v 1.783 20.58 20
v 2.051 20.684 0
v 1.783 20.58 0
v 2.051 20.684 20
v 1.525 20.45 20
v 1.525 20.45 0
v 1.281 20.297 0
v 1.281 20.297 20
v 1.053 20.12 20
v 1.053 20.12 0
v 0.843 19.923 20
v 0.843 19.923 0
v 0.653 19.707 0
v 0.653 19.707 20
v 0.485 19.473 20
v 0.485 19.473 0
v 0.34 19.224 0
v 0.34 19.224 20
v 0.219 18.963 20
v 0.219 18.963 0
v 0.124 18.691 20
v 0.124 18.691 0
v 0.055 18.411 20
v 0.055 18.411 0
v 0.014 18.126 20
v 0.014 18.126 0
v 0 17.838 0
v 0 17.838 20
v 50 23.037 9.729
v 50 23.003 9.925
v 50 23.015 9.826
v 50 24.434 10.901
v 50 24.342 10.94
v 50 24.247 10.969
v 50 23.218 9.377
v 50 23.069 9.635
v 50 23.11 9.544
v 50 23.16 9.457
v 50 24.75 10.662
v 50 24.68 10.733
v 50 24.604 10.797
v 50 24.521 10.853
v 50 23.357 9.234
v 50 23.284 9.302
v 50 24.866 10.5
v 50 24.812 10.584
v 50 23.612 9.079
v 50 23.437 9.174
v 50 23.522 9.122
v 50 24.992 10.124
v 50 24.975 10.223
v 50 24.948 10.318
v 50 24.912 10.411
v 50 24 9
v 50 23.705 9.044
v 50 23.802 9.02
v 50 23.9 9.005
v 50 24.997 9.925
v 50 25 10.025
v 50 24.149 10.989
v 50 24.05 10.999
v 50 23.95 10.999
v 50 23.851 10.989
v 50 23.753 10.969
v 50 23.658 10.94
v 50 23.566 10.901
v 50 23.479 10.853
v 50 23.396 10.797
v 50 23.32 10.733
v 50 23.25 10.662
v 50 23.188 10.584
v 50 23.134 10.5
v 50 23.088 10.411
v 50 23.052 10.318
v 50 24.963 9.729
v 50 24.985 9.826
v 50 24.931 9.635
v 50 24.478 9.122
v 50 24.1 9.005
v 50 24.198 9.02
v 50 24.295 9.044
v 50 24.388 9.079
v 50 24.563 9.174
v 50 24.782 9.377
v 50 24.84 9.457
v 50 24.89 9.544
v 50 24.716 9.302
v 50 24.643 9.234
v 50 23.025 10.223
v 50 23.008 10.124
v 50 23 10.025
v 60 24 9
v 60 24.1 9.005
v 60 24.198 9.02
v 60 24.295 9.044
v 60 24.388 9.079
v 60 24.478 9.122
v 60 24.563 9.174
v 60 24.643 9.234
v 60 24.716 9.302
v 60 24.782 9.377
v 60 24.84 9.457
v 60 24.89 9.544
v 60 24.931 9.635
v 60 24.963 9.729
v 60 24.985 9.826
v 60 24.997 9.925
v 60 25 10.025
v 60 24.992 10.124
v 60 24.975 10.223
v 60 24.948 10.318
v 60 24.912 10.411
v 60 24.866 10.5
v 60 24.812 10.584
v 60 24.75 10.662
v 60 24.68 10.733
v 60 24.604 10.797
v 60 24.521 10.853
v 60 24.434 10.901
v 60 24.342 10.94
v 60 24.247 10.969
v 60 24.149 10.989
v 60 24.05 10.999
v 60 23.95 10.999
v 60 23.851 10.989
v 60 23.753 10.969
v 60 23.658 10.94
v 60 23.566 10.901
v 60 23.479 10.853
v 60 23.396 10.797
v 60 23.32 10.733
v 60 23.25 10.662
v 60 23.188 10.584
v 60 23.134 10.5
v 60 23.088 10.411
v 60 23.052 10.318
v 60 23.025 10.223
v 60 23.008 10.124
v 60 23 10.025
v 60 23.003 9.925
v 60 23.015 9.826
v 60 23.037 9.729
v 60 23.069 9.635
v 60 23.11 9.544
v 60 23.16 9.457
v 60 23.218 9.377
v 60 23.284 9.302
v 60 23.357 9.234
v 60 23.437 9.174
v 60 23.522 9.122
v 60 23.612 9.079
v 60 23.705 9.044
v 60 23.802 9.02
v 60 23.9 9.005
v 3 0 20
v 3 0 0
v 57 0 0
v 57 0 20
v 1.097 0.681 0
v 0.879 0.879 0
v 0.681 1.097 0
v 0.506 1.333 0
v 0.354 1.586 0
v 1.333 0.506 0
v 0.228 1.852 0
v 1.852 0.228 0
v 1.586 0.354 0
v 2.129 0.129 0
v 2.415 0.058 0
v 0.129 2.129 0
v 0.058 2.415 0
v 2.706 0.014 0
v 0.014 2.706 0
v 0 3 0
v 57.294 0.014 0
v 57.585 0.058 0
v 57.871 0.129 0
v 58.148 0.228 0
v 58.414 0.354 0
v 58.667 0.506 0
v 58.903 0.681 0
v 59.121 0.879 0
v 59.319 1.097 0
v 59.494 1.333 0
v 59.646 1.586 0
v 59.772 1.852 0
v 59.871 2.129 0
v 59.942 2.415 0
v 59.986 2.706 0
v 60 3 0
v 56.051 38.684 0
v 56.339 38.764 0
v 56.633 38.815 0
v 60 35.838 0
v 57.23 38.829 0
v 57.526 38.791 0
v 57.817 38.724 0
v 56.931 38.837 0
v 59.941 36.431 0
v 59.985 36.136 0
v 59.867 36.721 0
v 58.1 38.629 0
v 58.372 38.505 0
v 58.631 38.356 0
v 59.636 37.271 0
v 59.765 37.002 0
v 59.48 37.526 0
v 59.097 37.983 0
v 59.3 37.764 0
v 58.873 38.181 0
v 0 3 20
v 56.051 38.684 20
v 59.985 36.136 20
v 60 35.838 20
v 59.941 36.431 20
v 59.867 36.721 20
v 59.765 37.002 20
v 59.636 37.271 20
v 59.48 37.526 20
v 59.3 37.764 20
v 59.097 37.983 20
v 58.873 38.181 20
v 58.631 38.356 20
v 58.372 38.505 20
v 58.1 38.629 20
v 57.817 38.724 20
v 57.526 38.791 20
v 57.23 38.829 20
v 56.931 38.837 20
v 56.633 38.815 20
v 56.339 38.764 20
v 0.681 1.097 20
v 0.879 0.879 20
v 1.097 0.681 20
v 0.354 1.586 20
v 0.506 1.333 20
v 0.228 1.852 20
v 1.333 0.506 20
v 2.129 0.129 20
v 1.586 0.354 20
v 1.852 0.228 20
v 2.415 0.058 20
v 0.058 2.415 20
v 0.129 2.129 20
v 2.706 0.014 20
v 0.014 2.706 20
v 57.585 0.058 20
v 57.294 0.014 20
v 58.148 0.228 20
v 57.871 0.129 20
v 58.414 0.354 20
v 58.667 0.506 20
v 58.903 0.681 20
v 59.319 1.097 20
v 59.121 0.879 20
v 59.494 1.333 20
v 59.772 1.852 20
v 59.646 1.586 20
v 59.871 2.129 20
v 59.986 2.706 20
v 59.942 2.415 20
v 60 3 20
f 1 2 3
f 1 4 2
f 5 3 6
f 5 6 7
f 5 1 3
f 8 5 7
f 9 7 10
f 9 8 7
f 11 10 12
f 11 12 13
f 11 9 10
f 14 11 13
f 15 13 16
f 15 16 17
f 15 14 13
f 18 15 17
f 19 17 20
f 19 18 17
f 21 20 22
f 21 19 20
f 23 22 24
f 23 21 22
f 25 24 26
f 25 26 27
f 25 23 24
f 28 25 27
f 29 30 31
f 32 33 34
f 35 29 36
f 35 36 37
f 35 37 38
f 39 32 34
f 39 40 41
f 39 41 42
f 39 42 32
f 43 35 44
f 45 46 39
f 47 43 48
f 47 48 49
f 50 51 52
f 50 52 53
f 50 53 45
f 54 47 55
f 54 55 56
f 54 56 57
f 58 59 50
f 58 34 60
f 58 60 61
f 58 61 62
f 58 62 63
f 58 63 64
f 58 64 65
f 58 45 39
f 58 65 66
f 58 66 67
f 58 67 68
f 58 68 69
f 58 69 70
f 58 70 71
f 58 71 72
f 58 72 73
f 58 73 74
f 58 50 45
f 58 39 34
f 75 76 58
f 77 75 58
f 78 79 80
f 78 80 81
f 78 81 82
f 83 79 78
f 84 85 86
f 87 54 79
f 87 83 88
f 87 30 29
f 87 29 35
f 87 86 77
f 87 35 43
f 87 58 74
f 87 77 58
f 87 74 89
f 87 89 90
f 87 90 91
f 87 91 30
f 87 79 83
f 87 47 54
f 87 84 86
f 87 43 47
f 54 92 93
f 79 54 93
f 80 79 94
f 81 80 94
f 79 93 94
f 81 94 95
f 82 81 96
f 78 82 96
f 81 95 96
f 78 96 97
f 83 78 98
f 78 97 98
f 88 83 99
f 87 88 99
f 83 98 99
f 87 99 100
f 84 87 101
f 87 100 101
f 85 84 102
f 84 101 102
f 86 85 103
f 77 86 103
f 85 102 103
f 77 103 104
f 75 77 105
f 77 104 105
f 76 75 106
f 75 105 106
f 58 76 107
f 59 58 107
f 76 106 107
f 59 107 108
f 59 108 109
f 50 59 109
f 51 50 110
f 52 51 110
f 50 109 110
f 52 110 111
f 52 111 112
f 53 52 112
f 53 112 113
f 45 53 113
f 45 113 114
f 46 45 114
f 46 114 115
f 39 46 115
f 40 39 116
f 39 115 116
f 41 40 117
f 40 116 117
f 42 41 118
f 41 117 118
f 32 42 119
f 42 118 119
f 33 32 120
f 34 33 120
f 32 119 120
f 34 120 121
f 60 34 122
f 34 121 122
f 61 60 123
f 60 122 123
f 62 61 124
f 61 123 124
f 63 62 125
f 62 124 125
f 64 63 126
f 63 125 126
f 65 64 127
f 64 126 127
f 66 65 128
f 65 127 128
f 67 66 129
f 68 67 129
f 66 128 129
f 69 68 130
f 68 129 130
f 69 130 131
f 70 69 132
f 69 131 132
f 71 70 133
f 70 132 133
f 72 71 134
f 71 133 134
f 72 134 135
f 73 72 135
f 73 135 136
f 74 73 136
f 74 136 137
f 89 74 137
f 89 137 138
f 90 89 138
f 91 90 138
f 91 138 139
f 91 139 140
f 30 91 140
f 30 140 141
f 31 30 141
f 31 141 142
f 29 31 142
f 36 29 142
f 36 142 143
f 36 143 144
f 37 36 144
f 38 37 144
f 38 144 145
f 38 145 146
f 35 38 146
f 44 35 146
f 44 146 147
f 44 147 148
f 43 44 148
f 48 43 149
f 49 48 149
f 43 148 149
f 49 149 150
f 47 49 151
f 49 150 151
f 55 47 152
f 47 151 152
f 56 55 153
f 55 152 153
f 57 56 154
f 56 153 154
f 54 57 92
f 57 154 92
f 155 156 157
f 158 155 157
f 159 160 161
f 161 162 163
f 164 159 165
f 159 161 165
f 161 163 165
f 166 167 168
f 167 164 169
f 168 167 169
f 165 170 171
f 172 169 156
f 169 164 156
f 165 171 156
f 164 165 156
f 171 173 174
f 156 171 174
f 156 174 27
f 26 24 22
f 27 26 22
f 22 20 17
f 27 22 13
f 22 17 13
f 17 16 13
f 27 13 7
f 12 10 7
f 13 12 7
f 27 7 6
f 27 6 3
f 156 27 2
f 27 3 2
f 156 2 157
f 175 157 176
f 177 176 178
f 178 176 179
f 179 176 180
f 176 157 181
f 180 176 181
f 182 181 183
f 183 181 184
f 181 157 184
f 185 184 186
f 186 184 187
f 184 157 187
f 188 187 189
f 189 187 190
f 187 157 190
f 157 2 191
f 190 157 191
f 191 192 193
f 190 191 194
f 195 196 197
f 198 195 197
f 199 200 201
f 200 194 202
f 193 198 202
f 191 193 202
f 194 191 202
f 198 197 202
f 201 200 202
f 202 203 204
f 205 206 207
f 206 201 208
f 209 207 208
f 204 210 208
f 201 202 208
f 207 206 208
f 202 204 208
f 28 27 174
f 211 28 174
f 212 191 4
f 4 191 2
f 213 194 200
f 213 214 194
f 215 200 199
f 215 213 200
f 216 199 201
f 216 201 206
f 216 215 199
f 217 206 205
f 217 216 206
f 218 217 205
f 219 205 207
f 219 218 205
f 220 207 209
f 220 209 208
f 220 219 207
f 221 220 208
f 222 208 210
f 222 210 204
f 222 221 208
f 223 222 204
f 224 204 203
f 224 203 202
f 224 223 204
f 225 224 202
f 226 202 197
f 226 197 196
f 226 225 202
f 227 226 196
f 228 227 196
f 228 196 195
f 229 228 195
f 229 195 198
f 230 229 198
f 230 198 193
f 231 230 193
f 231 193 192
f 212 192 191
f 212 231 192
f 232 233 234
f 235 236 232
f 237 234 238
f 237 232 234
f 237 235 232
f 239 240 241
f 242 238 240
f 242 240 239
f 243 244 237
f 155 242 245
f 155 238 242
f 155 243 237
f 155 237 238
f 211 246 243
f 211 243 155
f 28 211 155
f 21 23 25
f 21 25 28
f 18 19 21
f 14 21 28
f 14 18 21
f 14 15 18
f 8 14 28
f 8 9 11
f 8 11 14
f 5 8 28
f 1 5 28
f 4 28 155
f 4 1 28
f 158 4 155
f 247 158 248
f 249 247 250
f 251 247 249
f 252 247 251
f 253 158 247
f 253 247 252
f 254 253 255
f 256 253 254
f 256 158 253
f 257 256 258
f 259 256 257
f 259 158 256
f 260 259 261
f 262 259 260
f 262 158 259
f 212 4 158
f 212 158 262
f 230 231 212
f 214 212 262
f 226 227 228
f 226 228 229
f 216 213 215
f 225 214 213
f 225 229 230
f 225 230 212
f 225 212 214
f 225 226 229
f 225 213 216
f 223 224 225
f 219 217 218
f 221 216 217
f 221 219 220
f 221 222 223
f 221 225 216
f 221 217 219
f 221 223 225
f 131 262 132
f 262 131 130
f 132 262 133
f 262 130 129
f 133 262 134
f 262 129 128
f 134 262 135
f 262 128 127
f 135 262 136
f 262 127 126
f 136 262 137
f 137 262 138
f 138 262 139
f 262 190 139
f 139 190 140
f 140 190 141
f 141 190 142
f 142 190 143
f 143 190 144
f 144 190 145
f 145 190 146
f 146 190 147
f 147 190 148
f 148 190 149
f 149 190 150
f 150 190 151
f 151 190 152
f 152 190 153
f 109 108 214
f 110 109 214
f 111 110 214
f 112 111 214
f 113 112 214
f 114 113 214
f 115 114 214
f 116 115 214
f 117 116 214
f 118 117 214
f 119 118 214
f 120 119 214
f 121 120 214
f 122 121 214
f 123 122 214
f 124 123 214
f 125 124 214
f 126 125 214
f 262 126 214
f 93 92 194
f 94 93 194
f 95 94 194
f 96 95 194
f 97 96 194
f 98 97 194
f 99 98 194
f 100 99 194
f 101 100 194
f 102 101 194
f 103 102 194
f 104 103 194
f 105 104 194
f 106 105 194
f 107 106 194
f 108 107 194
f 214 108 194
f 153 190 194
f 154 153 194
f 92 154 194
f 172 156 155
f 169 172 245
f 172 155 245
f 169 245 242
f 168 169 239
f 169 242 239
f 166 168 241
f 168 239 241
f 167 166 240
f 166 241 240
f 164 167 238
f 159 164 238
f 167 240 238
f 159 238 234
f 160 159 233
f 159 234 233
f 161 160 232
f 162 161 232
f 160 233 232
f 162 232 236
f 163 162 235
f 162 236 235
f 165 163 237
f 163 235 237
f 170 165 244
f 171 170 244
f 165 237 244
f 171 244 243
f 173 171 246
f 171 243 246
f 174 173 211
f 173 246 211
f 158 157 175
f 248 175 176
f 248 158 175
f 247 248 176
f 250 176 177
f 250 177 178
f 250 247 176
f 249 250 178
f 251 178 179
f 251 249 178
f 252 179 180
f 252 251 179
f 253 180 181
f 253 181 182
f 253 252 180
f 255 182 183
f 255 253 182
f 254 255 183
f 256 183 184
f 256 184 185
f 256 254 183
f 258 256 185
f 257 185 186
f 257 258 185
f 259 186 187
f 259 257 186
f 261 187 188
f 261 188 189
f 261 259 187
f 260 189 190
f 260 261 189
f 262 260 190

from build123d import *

# Parameters (mm, degrees)
BOSS_EXTRU_1_DEPTH      = 20
CONG_1_R                = 3
ESQUISSE2_R             = 1
ENL_V_MAT_EXTRU_1_DEPTH = 10


with BuildPart() as part:
    # Esquisse1 → Boss.-Extru.1 (new body)
    with BuildSketch(Plane.XY):
        Polygon((0, 0), (60, 0), (60, 40), (0, 20), align=None)
    extrude(amount=BOSS_EXTRU_1_DEPTH)

    # Congé1
    cong_1_edges = [part.edges().sort_by_distance(p)[0] for p in [
        (0, 20, 10),
        (60, 40, 10),
        (60, 0, 10),
        (0, 0, 10),
    ]]
    fillet(cong_1_edges, radius=CONG_1_R)

    # Esquisse2 → Enlèv. mat.-Extru.1 (cut)
    with BuildSketch(Plane(origin=(60, 0, 0), x_dir=(0, 0, -1), z_dir=(1, 0, 0))):
        with Locations((-10, 24)):
            Circle(ESQUISSE2_R)
    extrude(amount=-ENL_V_MAT_EXTRU_1_DEPTH, mode=Mode.SUBTRACT)


solid = part.part
